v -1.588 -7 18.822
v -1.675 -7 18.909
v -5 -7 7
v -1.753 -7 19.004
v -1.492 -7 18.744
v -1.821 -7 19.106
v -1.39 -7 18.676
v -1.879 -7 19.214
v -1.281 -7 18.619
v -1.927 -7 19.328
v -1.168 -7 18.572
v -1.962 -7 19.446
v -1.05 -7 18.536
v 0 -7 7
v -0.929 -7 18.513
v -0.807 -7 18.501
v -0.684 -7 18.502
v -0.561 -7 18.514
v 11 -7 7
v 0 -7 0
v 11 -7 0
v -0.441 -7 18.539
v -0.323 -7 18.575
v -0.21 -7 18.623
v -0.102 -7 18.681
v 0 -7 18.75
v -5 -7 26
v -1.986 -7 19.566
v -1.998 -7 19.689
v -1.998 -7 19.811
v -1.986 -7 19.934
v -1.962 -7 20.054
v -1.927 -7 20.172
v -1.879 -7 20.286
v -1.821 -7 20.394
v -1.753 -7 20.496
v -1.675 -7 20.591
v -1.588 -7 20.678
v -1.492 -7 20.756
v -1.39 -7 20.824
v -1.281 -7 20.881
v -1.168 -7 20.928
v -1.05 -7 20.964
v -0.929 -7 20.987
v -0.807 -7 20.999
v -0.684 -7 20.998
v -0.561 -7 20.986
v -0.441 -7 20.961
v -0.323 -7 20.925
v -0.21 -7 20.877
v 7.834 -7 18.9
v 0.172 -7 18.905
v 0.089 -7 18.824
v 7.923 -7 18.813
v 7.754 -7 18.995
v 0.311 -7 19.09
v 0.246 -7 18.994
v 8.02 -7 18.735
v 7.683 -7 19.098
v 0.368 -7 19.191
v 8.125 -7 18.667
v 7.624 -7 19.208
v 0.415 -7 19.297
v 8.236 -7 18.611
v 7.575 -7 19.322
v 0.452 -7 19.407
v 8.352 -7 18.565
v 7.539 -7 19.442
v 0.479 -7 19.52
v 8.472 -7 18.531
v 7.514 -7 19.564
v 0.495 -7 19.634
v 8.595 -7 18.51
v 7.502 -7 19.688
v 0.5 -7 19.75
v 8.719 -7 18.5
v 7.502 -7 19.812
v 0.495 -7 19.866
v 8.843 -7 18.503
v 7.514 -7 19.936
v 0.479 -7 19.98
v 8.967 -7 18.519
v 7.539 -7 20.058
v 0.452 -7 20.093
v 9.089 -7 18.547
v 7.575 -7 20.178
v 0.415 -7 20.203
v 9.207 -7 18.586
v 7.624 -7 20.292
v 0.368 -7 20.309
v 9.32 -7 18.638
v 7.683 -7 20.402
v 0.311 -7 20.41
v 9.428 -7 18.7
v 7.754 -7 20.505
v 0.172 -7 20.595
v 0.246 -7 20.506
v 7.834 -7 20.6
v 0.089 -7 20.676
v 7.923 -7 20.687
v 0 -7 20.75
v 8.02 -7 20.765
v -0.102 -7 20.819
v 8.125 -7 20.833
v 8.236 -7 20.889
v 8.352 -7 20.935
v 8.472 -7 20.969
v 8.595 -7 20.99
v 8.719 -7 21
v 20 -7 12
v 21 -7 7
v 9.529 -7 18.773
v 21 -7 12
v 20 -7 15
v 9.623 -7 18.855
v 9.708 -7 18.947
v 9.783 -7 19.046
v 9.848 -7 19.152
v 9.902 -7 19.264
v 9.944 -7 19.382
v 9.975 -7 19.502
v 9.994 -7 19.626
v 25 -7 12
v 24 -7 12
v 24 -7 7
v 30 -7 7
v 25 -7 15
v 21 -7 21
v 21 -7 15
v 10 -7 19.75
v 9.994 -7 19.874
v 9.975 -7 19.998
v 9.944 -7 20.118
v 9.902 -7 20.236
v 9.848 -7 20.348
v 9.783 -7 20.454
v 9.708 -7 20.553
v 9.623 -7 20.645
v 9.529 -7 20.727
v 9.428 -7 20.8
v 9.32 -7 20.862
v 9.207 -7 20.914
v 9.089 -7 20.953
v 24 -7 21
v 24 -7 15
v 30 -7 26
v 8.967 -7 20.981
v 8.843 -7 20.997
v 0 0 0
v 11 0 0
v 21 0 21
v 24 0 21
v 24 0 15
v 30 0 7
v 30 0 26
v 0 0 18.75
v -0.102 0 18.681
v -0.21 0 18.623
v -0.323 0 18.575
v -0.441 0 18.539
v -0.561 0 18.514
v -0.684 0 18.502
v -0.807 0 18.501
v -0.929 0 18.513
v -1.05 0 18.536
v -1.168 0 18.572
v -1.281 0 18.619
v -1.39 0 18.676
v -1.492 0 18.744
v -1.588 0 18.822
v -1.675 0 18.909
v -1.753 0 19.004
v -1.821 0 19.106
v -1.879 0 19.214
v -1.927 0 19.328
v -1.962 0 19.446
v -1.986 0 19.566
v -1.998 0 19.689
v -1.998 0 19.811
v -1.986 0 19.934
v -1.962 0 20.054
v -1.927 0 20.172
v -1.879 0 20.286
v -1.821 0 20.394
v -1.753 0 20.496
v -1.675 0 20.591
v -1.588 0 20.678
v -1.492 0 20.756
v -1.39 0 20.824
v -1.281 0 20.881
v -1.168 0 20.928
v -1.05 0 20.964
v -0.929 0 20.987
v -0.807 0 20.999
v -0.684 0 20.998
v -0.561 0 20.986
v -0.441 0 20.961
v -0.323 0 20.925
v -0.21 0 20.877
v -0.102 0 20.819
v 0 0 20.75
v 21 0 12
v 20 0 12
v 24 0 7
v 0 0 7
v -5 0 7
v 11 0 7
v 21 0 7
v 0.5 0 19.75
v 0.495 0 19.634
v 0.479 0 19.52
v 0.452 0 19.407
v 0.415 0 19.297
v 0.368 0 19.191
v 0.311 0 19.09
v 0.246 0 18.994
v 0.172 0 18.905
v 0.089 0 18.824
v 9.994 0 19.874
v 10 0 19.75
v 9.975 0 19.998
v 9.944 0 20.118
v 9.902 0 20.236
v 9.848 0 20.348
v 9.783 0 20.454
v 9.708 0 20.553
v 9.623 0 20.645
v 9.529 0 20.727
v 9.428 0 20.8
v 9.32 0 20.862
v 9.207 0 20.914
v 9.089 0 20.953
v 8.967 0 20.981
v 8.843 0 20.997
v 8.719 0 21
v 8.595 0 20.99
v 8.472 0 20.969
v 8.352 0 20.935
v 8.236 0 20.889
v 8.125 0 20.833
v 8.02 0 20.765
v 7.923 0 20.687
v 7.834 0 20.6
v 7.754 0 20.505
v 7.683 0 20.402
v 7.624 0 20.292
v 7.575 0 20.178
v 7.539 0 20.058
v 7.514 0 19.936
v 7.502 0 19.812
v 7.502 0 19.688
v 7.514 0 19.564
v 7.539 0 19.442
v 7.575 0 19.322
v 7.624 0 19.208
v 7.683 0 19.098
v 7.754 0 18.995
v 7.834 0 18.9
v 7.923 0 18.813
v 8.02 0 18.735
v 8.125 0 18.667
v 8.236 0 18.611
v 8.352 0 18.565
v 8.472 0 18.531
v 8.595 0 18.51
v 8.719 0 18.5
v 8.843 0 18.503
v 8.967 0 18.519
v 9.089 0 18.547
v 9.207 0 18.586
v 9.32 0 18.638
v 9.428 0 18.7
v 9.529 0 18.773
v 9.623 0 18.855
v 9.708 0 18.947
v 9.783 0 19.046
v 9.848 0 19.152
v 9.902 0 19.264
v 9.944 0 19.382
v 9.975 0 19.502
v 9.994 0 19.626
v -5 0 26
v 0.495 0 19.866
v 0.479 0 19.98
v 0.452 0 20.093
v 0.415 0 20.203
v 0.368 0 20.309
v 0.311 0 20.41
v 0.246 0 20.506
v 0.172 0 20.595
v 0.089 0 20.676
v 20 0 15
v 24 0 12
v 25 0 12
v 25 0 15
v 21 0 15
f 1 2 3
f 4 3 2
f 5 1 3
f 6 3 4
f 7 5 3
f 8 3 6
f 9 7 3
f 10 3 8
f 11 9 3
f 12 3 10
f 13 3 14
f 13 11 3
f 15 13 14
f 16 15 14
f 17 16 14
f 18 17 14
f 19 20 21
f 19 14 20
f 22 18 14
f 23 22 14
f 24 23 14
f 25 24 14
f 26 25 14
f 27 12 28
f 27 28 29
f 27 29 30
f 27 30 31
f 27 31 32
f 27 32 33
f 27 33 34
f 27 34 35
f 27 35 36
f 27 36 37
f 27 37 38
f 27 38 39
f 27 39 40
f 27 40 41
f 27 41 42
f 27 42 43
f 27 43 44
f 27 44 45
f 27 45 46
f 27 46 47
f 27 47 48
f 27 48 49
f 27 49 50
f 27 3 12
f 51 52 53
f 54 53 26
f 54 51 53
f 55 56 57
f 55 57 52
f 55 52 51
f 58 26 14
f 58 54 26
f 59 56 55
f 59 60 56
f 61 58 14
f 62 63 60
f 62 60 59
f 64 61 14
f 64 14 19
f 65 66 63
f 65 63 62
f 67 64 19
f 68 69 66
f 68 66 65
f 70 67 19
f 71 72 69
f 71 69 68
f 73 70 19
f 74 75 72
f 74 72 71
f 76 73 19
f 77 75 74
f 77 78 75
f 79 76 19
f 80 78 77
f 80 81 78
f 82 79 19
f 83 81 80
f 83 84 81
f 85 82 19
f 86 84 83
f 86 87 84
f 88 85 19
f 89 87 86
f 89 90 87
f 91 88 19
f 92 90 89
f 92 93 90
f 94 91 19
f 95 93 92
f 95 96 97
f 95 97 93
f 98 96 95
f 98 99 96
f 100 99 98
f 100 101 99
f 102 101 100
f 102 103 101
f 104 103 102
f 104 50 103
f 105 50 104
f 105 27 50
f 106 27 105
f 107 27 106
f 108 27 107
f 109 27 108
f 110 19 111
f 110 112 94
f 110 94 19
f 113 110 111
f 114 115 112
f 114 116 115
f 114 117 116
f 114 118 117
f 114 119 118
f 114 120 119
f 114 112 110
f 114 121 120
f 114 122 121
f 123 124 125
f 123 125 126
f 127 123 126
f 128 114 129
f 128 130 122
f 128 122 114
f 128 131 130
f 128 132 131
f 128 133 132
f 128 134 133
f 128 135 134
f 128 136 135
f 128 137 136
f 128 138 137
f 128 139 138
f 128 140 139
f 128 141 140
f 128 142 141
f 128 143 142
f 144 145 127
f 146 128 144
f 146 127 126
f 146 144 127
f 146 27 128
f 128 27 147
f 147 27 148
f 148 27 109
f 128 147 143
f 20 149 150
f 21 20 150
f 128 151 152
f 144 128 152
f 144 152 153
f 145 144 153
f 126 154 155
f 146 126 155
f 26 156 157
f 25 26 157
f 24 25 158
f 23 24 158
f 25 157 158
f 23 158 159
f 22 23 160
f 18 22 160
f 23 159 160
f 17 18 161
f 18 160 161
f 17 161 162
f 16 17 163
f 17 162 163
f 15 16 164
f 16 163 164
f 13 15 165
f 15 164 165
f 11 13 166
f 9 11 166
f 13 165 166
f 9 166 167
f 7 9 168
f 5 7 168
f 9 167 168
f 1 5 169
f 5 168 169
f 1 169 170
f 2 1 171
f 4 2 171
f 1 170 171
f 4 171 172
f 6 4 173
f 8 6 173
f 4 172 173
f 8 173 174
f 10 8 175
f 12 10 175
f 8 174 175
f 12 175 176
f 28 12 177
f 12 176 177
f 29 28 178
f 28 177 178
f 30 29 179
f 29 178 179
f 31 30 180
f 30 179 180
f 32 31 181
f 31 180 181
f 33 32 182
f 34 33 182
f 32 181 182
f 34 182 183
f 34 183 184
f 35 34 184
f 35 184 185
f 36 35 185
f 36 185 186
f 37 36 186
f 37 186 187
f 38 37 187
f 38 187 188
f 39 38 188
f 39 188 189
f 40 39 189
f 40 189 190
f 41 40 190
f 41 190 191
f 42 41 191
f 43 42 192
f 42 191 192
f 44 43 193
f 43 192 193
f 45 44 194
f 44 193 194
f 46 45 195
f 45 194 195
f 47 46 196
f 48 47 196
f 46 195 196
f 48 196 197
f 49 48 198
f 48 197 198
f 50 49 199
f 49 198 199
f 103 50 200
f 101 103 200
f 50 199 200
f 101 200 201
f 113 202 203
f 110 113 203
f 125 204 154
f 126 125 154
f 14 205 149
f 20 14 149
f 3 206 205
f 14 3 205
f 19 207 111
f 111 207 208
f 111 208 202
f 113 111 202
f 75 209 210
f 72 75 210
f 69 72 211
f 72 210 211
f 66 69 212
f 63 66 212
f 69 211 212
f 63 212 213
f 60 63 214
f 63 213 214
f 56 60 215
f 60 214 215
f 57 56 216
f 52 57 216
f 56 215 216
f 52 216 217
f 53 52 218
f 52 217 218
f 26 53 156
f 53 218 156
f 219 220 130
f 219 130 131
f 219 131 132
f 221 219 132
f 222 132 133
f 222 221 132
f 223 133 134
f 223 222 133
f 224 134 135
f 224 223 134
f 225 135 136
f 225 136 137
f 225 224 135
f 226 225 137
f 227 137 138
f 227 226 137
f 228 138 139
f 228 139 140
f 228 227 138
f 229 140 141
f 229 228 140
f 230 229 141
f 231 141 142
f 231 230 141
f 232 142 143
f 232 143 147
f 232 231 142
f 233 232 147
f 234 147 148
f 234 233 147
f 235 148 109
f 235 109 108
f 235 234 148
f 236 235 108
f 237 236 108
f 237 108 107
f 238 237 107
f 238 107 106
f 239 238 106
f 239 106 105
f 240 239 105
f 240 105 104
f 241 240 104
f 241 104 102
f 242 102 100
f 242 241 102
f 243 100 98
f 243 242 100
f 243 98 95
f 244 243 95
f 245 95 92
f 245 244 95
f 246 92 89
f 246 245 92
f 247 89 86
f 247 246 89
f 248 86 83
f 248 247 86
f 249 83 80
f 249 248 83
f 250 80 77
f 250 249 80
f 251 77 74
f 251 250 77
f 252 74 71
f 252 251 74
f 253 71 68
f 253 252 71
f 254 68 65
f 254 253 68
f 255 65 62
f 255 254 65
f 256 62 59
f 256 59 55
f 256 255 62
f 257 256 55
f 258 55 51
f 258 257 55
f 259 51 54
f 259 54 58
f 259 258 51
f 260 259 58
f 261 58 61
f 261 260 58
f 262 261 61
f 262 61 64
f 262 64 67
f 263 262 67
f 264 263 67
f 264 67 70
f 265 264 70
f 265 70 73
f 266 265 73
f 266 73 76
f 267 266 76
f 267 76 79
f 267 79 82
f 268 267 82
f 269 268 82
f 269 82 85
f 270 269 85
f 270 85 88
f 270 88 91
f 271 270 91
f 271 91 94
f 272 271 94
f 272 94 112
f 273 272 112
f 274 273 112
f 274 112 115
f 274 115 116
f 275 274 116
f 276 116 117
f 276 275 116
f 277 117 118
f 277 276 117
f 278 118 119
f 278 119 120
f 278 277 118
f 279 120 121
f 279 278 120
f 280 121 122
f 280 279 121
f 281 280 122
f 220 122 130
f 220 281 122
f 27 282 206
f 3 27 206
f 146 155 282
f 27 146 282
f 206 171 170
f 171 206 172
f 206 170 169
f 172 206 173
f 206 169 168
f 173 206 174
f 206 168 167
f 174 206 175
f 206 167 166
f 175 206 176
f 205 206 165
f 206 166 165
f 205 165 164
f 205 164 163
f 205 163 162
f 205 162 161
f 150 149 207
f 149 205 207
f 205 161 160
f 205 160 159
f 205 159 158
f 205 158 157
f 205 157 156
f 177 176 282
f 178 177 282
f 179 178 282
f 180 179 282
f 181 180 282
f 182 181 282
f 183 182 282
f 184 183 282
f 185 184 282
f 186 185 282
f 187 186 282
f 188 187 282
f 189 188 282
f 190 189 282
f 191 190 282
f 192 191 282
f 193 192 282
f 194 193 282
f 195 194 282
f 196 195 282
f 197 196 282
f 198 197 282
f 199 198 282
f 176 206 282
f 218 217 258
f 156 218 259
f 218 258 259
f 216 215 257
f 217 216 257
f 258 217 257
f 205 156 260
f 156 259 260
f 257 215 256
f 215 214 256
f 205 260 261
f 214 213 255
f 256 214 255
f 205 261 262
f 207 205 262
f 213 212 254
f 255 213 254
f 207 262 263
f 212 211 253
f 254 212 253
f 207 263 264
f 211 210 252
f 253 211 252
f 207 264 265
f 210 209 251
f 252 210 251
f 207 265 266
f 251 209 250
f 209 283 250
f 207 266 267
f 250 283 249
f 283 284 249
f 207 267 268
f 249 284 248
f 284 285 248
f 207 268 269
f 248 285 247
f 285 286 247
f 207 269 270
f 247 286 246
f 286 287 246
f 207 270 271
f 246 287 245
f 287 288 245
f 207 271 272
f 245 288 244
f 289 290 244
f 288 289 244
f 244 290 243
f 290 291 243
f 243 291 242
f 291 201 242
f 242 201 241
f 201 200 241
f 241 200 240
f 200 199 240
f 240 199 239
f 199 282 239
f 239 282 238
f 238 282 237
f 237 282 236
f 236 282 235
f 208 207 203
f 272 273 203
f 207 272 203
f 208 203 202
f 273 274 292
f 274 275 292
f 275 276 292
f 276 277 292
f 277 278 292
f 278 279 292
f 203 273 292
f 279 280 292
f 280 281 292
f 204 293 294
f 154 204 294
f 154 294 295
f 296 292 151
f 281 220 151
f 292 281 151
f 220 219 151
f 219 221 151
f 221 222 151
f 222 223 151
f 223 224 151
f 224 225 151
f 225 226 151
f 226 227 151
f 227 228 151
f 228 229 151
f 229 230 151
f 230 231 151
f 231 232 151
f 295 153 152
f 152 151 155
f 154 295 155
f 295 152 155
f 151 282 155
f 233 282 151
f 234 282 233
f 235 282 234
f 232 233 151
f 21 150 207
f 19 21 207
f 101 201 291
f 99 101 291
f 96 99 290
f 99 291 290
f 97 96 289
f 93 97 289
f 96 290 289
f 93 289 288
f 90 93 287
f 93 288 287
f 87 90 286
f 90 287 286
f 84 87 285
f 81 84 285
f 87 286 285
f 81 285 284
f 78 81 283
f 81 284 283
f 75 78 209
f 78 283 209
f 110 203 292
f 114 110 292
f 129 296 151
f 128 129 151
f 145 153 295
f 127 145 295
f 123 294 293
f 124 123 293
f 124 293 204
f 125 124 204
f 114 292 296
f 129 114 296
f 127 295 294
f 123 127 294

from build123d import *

# Parameters (mm, degrees)
F0_R     = 1.25
F1_DEPTH = 7


with BuildPart() as f1:
    # F0 (on Front) → F1 (new body)
    with BuildSketch(Plane.XZ):
        with BuildLine():
            Line((0, 7), (0, 0))
            Line((0, 0), (11, 0))
            Line((11, 0), (11, 7))
            Line((11, 7), (21, 7))
            Line((21, 7), (21, 12))
            Line((21, 12), (20, 12))
            Line((20, 12), (20, 15))
            Line((20, 15), (21, 15))
            Line((21, 15), (21, 21))
            Line((21, 21), (24, 21))
            Line((24, 21), (24, 15))
            Line((24, 15), (25, 15))
            Line((25, 15), (25, 12))
            Line((25, 12), (24, 12))
            Line((24, 12), (24, 7))
            Line((24, 7), (30, 7))
            Line((30, 7), (30, 26))
            Line((30, 26), (0, 26))
            Line((0, 26), (0, 20.75))
            ThreePointArc((0, 20.75), (0.368034, 20.309017), (0.5, 19.75))
            ThreePointArc((0.5, 19.75), (0.368034, 19.190983), (0, 18.75))
            Line((0, 18.75), (0, 7))
        make_face()
        with Locations((8.75, 19.75)):
            Circle(F0_R, mode=Mode.SUBTRACT)
        with BuildLine():
            Line((-5, 7), (0, 7))
            Line((0, 7), (0, 18.75))
            ThreePointArc((0, 18.75), (-2, 19.75), (0, 20.75))
            Line((0, 20.75), (0, 26))
            Line((0, 26), (-5, 26))
            Line((-5, 26), (-5, 7))
        make_face()
    extrude(amount=F1_DEPTH)


solid = f1.part
